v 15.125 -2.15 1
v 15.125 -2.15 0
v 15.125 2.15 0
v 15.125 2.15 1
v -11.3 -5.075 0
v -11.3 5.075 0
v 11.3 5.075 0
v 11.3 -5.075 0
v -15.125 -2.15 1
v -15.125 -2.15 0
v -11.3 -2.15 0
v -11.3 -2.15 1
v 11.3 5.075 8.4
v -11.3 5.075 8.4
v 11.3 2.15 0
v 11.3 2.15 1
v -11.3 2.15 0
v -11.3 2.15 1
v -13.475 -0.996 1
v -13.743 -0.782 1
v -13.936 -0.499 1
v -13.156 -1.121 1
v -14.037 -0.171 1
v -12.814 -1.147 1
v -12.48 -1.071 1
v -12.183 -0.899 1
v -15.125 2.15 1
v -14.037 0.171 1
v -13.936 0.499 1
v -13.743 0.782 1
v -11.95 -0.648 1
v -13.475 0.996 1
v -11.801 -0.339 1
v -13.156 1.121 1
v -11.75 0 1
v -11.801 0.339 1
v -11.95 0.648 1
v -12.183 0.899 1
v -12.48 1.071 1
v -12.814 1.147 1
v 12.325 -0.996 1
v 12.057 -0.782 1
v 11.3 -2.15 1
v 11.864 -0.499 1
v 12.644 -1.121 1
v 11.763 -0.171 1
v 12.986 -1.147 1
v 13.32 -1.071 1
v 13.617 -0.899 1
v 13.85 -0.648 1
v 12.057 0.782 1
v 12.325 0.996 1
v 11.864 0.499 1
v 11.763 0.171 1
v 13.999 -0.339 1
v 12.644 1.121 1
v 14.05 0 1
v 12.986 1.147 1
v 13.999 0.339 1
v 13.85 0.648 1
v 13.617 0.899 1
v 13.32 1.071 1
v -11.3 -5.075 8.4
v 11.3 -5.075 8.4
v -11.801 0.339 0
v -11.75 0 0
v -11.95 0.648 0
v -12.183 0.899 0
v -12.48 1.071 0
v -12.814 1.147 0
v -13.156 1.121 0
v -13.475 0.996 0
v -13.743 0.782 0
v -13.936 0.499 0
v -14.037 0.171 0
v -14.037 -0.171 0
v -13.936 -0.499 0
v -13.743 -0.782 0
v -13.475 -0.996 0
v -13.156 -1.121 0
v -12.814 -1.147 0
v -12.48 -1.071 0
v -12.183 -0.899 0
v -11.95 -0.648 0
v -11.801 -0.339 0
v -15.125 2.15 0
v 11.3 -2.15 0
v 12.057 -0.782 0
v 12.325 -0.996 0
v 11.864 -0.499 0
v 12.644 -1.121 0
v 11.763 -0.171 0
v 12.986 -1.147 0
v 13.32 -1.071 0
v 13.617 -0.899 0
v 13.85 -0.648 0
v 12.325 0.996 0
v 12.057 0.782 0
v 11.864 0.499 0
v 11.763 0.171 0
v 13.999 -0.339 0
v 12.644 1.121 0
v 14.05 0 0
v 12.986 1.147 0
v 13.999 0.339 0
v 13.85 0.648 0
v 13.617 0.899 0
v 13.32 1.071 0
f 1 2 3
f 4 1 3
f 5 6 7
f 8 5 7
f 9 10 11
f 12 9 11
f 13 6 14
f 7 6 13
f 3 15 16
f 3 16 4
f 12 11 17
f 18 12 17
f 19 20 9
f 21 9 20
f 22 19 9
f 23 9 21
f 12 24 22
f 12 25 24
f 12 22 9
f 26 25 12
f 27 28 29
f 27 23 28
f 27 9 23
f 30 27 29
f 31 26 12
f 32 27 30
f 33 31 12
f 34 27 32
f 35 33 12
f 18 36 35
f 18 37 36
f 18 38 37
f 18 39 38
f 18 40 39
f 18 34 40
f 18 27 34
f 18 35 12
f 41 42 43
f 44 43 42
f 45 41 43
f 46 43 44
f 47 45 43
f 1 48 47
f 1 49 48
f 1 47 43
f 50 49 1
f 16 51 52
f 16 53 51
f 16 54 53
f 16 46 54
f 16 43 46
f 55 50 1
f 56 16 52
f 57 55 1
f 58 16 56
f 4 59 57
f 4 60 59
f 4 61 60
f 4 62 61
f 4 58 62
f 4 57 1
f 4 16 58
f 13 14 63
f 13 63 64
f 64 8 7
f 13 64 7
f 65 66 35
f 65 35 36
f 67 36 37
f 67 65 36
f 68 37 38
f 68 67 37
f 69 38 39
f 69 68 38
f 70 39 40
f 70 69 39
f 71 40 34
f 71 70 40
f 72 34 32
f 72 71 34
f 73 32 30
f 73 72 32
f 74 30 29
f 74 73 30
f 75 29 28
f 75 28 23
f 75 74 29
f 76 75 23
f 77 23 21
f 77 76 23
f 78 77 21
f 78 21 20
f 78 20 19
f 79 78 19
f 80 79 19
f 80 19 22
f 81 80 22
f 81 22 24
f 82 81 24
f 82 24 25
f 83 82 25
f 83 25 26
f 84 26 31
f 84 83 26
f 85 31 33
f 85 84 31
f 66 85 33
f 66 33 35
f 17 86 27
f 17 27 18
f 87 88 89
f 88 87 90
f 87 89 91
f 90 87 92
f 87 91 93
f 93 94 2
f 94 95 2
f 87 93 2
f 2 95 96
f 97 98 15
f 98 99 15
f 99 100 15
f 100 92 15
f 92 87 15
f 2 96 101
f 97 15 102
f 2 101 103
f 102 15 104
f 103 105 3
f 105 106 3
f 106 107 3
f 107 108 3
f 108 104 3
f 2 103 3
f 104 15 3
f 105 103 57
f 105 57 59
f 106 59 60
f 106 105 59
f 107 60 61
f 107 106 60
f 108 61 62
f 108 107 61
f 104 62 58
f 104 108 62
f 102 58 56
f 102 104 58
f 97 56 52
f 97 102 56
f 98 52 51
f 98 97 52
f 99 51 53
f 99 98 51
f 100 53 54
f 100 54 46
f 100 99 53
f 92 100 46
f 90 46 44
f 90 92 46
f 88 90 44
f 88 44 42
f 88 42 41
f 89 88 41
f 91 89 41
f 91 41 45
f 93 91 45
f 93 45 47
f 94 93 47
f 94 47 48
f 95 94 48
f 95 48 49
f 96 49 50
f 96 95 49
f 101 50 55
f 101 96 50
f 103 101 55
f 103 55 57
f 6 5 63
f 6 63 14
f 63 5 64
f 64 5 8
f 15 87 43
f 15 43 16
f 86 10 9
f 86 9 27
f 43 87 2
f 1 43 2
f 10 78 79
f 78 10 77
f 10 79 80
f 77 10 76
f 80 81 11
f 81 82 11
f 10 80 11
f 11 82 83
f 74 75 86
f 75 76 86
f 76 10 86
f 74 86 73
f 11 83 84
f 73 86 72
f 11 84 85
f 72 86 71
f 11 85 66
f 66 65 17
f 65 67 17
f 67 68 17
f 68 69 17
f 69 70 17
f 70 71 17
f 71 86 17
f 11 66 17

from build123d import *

# Parameters (mm, degrees)
SKETCH1_W     = 22.6
SKETCH1_H     = 10.15
MAIN_DEPTH    = 8.4
SKETCH2_W     = 3.825
SKETCH2_H     = 4.3
SKETCH2_R     = 1.15
FIX_2_DEPTH   = 1
FIX_2_2_DEPTH = 1


with BuildPart() as part:
    # Sketch1 → Main (new body)
    with BuildSketch(Plane.XY):
        Rectangle(SKETCH1_W, SKETCH1_H)
    extrude(amount=MAIN_DEPTH)


with BuildPart() as body_2:
    # Sketch2 → Fix 2 (new body)
    with BuildSketch(Plane.XY):
        with Locations((-13.2125, 0)):
            Rectangle(SKETCH2_W, SKETCH2_H)
        with Locations((-12.9, 0)):
            Circle(SKETCH2_R, mode=Mode.SUBTRACT)
    extrude(amount=FIX_2_DEPTH)


with BuildPart() as body_3:
    # Sketch2 → Fix 2 2 (new body)
    with BuildSketch(Plane.XY):
        with Locations((13.2125, 0)):
            Rectangle(SKETCH2_W, SKETCH2_H)
        with Locations((12.9, 0)):
            Circle(SKETCH2_R, mode=Mode.SUBTRACT)
    extrude(amount=FIX_2_2_DEPTH)


solid = Compound([part.part, body_2.part, body_3.part])
